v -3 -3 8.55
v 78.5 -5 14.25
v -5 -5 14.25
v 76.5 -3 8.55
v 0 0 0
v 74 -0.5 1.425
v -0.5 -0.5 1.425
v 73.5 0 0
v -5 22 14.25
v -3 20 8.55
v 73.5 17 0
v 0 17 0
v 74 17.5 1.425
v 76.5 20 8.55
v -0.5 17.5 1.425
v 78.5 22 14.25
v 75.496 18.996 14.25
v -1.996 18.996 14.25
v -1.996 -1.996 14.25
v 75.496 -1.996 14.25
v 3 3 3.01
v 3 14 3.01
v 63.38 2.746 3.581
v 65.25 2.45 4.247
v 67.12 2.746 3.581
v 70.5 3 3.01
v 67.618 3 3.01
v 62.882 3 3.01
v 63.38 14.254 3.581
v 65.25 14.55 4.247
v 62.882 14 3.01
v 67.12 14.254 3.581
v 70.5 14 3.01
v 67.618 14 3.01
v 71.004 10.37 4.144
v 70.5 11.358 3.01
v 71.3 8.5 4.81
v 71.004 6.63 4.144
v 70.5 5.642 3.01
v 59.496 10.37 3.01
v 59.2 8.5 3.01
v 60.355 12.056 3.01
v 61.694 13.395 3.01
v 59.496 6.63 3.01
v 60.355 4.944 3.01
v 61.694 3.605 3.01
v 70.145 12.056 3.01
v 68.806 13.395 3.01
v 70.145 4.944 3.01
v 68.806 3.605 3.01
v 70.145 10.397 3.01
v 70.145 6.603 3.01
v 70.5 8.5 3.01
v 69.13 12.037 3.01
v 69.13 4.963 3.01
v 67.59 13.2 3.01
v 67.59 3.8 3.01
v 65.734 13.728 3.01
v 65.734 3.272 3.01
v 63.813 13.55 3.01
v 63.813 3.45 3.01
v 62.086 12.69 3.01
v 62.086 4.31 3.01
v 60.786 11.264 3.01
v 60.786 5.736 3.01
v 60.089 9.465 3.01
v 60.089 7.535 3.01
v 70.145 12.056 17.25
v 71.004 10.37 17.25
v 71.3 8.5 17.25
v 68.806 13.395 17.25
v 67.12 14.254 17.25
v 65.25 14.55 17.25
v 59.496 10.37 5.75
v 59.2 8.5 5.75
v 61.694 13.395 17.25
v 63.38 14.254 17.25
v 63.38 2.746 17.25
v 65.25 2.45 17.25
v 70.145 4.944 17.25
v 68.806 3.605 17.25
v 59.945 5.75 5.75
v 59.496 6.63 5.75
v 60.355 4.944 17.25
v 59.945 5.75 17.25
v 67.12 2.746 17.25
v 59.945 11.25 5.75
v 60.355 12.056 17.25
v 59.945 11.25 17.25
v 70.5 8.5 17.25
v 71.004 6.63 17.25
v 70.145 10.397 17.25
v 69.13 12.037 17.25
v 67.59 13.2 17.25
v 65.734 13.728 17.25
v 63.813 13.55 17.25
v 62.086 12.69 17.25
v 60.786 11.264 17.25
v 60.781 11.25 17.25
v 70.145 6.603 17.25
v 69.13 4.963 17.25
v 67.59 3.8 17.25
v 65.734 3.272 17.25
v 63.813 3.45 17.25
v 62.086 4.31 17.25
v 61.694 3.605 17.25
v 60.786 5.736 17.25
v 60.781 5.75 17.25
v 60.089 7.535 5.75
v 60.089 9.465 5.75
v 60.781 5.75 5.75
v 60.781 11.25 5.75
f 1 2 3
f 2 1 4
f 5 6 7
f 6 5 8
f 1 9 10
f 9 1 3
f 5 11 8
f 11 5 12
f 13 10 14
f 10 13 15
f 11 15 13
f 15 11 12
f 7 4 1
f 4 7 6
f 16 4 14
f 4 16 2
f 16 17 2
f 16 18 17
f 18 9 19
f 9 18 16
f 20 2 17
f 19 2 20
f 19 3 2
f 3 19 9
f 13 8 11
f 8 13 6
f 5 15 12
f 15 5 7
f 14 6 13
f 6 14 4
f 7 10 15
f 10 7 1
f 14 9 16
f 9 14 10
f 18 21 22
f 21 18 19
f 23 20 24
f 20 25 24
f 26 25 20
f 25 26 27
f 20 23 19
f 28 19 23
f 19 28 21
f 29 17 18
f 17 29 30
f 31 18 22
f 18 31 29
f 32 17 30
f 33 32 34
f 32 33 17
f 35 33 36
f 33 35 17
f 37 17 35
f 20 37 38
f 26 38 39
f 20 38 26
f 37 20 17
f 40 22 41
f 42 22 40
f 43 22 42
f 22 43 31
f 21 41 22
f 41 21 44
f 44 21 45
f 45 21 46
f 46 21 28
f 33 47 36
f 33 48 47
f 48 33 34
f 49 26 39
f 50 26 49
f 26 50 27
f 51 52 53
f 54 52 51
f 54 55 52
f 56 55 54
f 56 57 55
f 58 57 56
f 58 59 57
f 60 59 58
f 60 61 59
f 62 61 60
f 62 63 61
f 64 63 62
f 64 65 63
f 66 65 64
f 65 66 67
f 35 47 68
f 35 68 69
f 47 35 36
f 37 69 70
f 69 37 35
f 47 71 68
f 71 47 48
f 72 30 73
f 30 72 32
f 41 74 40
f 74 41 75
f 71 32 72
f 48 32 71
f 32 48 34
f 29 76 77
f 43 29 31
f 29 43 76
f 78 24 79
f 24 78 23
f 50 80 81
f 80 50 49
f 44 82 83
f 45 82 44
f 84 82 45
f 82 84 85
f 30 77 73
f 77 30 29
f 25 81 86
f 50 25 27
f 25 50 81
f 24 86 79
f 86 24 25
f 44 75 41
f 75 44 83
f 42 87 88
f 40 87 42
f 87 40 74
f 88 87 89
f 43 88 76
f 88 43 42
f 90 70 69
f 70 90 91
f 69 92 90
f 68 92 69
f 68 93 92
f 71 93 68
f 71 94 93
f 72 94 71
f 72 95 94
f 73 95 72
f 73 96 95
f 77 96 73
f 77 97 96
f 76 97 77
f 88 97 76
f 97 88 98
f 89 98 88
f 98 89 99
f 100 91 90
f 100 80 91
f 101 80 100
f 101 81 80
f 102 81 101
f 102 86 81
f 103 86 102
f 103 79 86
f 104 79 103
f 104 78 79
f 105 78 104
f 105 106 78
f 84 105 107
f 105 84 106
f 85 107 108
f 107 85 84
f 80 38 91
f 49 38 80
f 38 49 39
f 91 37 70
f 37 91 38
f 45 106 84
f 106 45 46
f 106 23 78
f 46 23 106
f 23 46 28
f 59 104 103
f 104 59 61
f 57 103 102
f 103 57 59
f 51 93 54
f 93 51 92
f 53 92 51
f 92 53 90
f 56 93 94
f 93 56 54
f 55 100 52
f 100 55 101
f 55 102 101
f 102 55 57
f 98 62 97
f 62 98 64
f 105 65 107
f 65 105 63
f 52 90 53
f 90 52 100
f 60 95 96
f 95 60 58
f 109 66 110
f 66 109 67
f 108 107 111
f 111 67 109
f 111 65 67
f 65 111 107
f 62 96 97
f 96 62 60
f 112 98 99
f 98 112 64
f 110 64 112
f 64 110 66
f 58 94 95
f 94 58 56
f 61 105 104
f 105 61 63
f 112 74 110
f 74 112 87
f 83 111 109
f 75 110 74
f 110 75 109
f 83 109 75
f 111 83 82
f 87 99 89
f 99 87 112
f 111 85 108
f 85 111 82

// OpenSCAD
// file: triangulation.scad
function _furthestAwayFromPoint(points,poly,z,bestD=-1,bestPos=0,pos=0) = 
    len(poly) <= pos ? bestPos :
    norm(points[poly[pos]]-z) > bestD ? _furthestAwayFromPoint(points,poly,z,bestD=norm(points[poly[pos]]-z),bestPos=pos,pos=pos+1) :
    _furthestAwayFromPoint(points,poly,z,bestD=bestD,bestPos=bestPos,pos=pos+1);
    
function _triangleArea(a,b,c) = let(cr=cross(b-a,c-a)/2)
        is_num(cr) ? abs(cr) : norm(cr);
    
function _furthestAwayFromLine(points,poly,z1,z2,bestArea=-1,bestPos=0,pos=0) = 
    len(poly) <= pos ? bestPos :
    _triangleArea(z1,z2,points[poly[pos]]) > bestArea ? _furthestAwayFromLine(points,poly,z1,z2,bestArea=_triangleArea(z1,z2,points[poly[pos]]),bestPos=pos,pos=pos+1) :
    _furthestAwayFromLine(points,poly,z1,z2,bestArea=bestArea,bestPos=bestPos,pos=pos+1);
    
function normalize(v) = v/norm(v);

function _winding(points,poly,sum=0,pos=0) =
    pos >= len(poly) ? sum :
    _winding(points,poly,sum=sum+(points[poly[(pos+1)%len(poly)]][0]-points[poly[pos]][0])*(points[poly[(pos+1)%len(poly)]][1]+points[poly[pos]][1]),pos=pos+1);

function _isCCW(points,poly) =
_winding(points,poly) < 0;

function identifyPlane(points,poly) = 
let(i=_furthestAwayFromPoint(points,poly,points[poly[0]]),
           j=_furthestAwayFromLine(points,poly,points[poly[0]],points[poly[i]]),
           normal = cross(points[poly[i]]-points[poly[0]],points[poly[j]]-points[poly[0]]),
           a = points[poly[i]]-points[poly[0]],
           b = cross(normal,a),
           cs = [points[poly[0]],normalize(a),normalize(b),normalize(normal)])
           cs;
                      
function projectPoint(coordsys,p) = let(v=p-coordsys[0],
           vp=v-(v*coordsys[3])*coordsys[3]) [vp*coordsys[1],vp*coordsys[2]];
           
function projectPoints(coordsys,p) = [for(v=p) projectPoint(coordsys,v)];
    
function _removeDuplicates(points,poly)
    = [for (i=[0:len(poly)-1]) if (points[poly[(i+1)%len(poly)]] != points[poly[i]]) poly[i]];
    
function triangulate(points,poly=undef,holes=[]) = 
    let(poly = poly==undef ? [for(i=[0:1:len(points)-1]) i] : poly)
    let(poly = _removeDuplicates(points,poly),
        holes = [for(h=holes) _removeDuplicates(points,h)])
    len(points[poly[0]]) == 2 ?triangulate2D(points,poly,holes) : triangulate2D(projectPoints(identifyPlane(points,poly),points),poly,holes);
    
function _leftMostHoleData(points,holes,indexOfHole=0,indexInHole=0,bestData=undef,) =
    indexOfHole >= len(holes) ? bestData[1] :
    indexInHole >= len(holes[indexOfHole]) ? _leftMostHoleData(points,holes,indexOfHole=indexOfHole+1,indexInHole=0,bestData=bestData) :
    bestData==undef || points[holes[indexOfHole][indexInHole]][0] < bestData[0] ? _leftMostHoleData(points,holes,indexOfHole=indexOfHole,indexInHole=indexInHole+1,bestData=[points[holes[indexOfHole][indexInHole]][0], [indexOfHole, indexInHole]]) :
    _leftMostHoleData(points,holes,indexOfHole=indexOfHole,indexInHole=indexInHole+1,bestData=bestData);
    
function _rightMostPrimaryData(points,primary,limitX,pos=0,bestData=undef) =   
    pos >= len(primary) ?  bestData[1] :    
    points[primary[pos]][0] < limitX && (bestData==undef || points[primary[pos]] > bestData[0]) ?  _rightMostPrimaryData(points,primary,limitX,pos=pos+1,bestData=[points[primary[pos]][0],pos]) :
    _rightMostPrimaryData(points,primary,limitX,pos=pos+1,bestData=bestData);

function _makeLoop(start,loop,index) = concat([start],[for(i=[0:len(loop)]) loop[(i+index)%len(loop)]],[start]);

function _addLoop(primary,holes,indexWithinPrimary,indexOfHole,indexWithinHole) = 
    let(hole=holes[indexOfHole],
        newHoles=[for(i=[0:len(holes)-1]) if(i!=indexOfHole) holes[i]],
        newPrimary=[for(i=[0:len(primary)-1]) for(p= i!=indexWithinPrimary ? [primary[i]] : _makeLoop(primary[i],hole,indexWithinHole)) p])
       [newPrimary,newHoles];
        
function _removeHoles1(points,primary,holes) =
    len(holes) == 0 ? primary :
    let(holeData=_leftMostHoleData(points,holes),
        indexOfHole=holeData[0],
        indexWithinHole=holeData[1],
        holePointIndex=holes[indexOfHole][indexWithinHole],
        hp=points[holePointIndex],
        indexWithinPrimary=_rightMostPrimaryData(points,primary,hp[0]),
        primaryAndHoles=_addLoop(primary,holes,indexWithinPrimary,indexOfHole,indexWithinHole)) _removeHoles1(points,primaryAndHoles[0],primaryAndHoles[1]);   
        
function _removeHolesAndReorient(points,primary,holes) =    let(points=_isCCW(points,primary)?points:[for(p=points) [p[0],-p[1]]])
        [points,_removeHoles1(points,primary,[for(h=holes) _orient(newPoints,h,ccw=false)])];

function mod(a,b) = let(m=a%b) m < 0 ? m+b : m;

function _delPoint(v,i) = [for(j=[0:1:len(v)-1]) if(i!=j) v[j]];
    
function _isCCWTriangle(a,b,c) = cross(b-a,c-a) >= 0;
    
function _crosses(points,poly,a,b,ignore,pos=0) =     
    pos >= len(poly) ? false :
    ignore != pos && ignore !=  mod(pos+1,len(poly)) && _isCross(points[poly[pos]],points[poly[mod(pos+1,len(poly))]],a,b) ? true : _crosses(points,poly,a,b,pos=pos+1);

function _isReflex(points,poly,i) = 
    let(n=len(poly),
        a=points[poly[mod(i-1,n)]],
        b=points[poly[i]],
        c=points[poly[mod(i+1,n)]]) cross(b-a,c-b) < 0;
                
function _checkEar2(points,poly,a,b,c,j) = 
   let(p=points[poly[mod(j,len(poly))]],
       c1=cross(p-a,b-a))
       ! ( c1*cross(p-b,c-b) >0 && c1*cross(p-c,a-c)>0 );
                
function _checkEar(points,poly,a,b,c,i,j) =
    mod(j,len(poly))==mod(i-1,len(poly)) ? true :
    _isReflex(points,poly,mod(j,len(poly))) && ! _checkEar2(points,poly,a,b,c,j) ? false :
    _checkEar(points,poly,a,b,c,i,j+1);

function _isEar(points,poly,i) = 
    _isReflex(points,poly,i) ? false :
    let(n=len(poly),
        a=points[poly[mod(i-1,n)]],
        b=points[poly[i]],
        c=points[poly[mod(i+1,n)]],
        j=i+2)
        _checkEar(points,poly,a,b,c,i,i+2);        

function _findEar(points,poly,pos=0) =
    assert(pos<len(poly))
    _isEar(points,poly,pos) ? pos : _findEar(points,poly,pos=pos+1);

function _cutEar(points,poly) = 
    let(n=len(poly),
        i=_findEar(points,poly))
        _delPoint(poly,i);
            
function _getEar(points,poly) = 
    let(n=len(poly),
        i=_findEar(points,poly))
        [poly[mod(i-1,n)],poly[i],poly[mod(i+1,n)]];
        
function _reverse(v) = [for(i=[len(v)-1:-1:0]) v[i]];
    
function _orient(points,poly,ccw=true) = !!_isCCW(points,poly) == ccw ? poly : _reverse(poly);

function triangulate2D(points,poly,holes=[],soFar=[]) =
    let(pp = _removeHolesAndReorient(points,poly,holes),
    points=pp[0],
    poly=pp[1])
    len(poly) == 3 ? concat(soFar,[poly]) :
    triangulate2D(points,_cutEar(points,poly),soFar=concat(soFar,[_getEar(points,poly)]));
    
module showMesh(points,tt,width=1) 
{
    for(t=tt) {
        for(i=[0:1:len(t)-1]) {
            hull() {
                translate(points[t[i]]) sphere(d=width);
                translate(points[t[(i+1)%len(t)]]) sphere(d=width);
            }
        }
    }
}

function _find(needle,haystack) = let(f=search([needle], haystack)) f==[[]] ? undef : f[0];

function _refineTriangle(triangle,maxEdge) =
    let(a = triangle[0],
        b = triangle[1],
        c = triangle[2],
        ab = norm(a-b),
        bc = norm(b-c),
        ca = norm(c-a))
        ab <= maxEdge && bc <= maxEdge && ca <= maxEdge ? [triangle] :
        ab > maxEdge && bc > maxEdge && ca > maxEdge ? [[a,(a+b)/2,(a+c)/2],[b,(b+c)/2,(a+b)/2],[c,(a+c)/2,(b+c)/2],[(a+c)/2,(a+b)/2,(b+c)/2]] :
    ab > maxEdge && bc > maxEdge ? [[b,(b+c)/2,(a+b)/2],[a,(a+b)/2,(b+c)/2],[c,a,(b+c)/2]] :
    bc > maxEdge && ca > maxEdge ? [[c,(c+a)/2,(b+c)/2],[b,(b+c)/2,(c+a)/2],[a,b,(c+a)/2]] :
    ca > maxEdge && ab > maxEdge ? [[a,(a+b)/2,(c+a)/2],[c,(c+a)/2,(a+b)/2],[b,c,(a+b)/2]] :
    ab > maxEdge ? [[a,(a+b)/2,c],[(a+b)/2,b,c]] :
    bc > maxEdge ? [[b,(b+c)/2,a],[(b+c)/2,c,a]] :
    /*ca > maxEdge */ [[c,(c+a)/2,b],[(c+a)/2,a,b]];

function _refineMesh1(triangles,maxEdge,pos=0,newTriangles=[]) =
    pos >= len(triangles) ? newTriangles :
    _refineMesh1(triangles,maxEdge,pos=pos+1,newTriangles=concat(newTriangles,_refineTriangle(triangles[pos],maxEdge)));
    
/* simpler but slower */
function _refineMesh1(triangles,maxEdge) =
    [for(t=triangles) for(tr=_refineTriangle(t,maxEdge)) tr];


function _maxEdge(faces) = max([for(f=faces) for(i=[0:len(f)-1]) norm(f[(i+1)%len(f)]-f[i])]);

function _refineMeshN(triangles,maxEdge,n=0) =
    n <= 0 ? triangles : _refineMeshN(_refineMesh1(triangles,maxEdge),maxEdge,n=n-1);
    
function _newPointsAndFaces(pointsAndFaces,face,faceSoFar=[]) =
    let(pos=len(faceSoFar),
        points=pointsAndFaces[0],
        faces=pointsAndFaces[1]
    )
    pos >= len(face) ? [points,concat(faces,[faceSoFar])] :
    let(v=face[pos],
        i=_find(v,points)) i==undef ? _newPointsAndFaces([concat(points,[v]),faces],face,faceSoFar=concat(faceSoFar,[len(points)])) : _newPointsAndFaces(pointsAndFaces,face,faceSoFar=concat(faceSoFar,[i]));            
        
function _toPointsAndFaces(faces,pointsAndFaces=[[],[]], pos=0) =
    pos >= len(faces) ? pointsAndFaces :
    _toPointsAndFaces(faces,_newPointsAndFaces(pointsAndFaces,faces[pos]),pos=pos+1);
    
function refineMesh(mesh=undef,points=[],triangles=[],maxEdge=5) =
    let(
        points=mesh==undef?points:mesh[0],
        triangles=mesh==undef?triangles:mesh[1],
        tris = [for (t=triangles) [for (v=t) points[v]]],
        longestEdge = _maxEdge(tris),
        n = ceil(ln(longestEdge/maxEdge)/ln(2)),
        newTris = _refineMeshN(tris, maxEdge, n)) _toPointsAndFaces(newTris);
    
function _cutZ(a,b,z,normal) =
    let(an = a*normal)
        an == z ? a :
        let(bn = b*normal)
        bn == z ? b :
        let(t=(z-a*normal)/(b*normal-a*normal))
        (1-t)*a+t*b;
    
function _cutTriangle0(t, z, normal) = 
    /* cut lines joining vertex 0 to others */
    t[1]*normal == z ?
    let(cut02 = _cutZ(t[0],t[2],z,normal))
    [[cut02,t[0],t[1]],[cut02,t[1],t[2]]] :
    t[2][2] == z ?
    let(cut01 = _cutZ(t[0],t[1],z,normal))
    [[cut01,t[2],t[0]],[cut01,t[1],t[2]]] :
    let(cut01 = _cutZ(t[0],t[1],z,normal),
        cut02 = _cutZ(t[0],t[2],z,normal))
    [[cut02,t[0],cut01],
     [t[1],t[2],cut02],
     [cut02,cut01,t[1]]];

function _cutTriangle(t,z,normal) = 
    (t[0]*normal <= z && t[1]*normal <= z && t[2]*normal <= z) || (t[0]*normal >= z && t[1]*normal >= z && t[2]*normal >= z ) ? [t] :
    (t[0]*normal >= z && t[1]*normal >= z) || (t[0]*normal <= z && t[1]*normal <= z) ? _cutTriangle0([t[2],t[0],t[1]], z,normal) :
    (t[1]*normal >= z && t[2]*normal >= z) || (t[1]*normal <= z && t[2]*normal <= z) ? _cutTriangle0(t, z, normal) :
    _cutTriangle0([t[1],t[2],t[0]],z, normal);

function cutMesh(mesh=undef,points=[],triangles=[],slice=0,normal=[1,0,0]) =
        sliceMesh(mesh=mesh,points=points,triangles=triangles,slices=[slice],normal=normal);
            
function _normalize(v) = 
    let(vv = 
        v[0] == 0 && v[1] == 0 ? [0,0,sign(v[2])] :
        v[0] == 0 && v[2] == 0 ? [0,sign(v[1]),0] :
        v[1] == 0 && v[2] == 0 ? [sign(v[0]),0,0] :
        v / norm(v))
        [for(i=[0:1:len(v)-1]) vv[i]];
            
function _sliceTriangles(triangles,slices,normal,pos=0) =
    pos >= len(slices) ? triangles :
    _sliceTriangles([for(t=triangles) for(s=_cutTriangle(t,slices[pos],normal)) s],slices,normal,pos=pos+1);
        
function _makeSlices(points,triangles,slices,normal,spacing) =
    slices != undef ? slices :
    let(zs = [for(t=triangles) for(v=t) points[v]*normal],
        zMin = min(zs),
        zMax = max(zs),
        n = ceil((zMax-zMin) / spacing)-1)
        echo(n)n <= 0 ? [] :
        [for(i=[1:1:n]) zMin+i*spacing];    

function sliceMesh(mesh=undef,points=[],triangles=[],slices=undef,spacing=undef,normal=[1,0,0]) =
        let(points=mesh==undef?points:mesh[0],triangles=mesh==undef?triangles:mesh[1],
        normal=_normalize(normal),
        slices=_makeSlices(points,triangles,slices,normal,spacing))
        _toPointsAndFaces(_sliceTriangles([for(t=triangles) [for (v=t) points[v]]],slices,normal));
            
function _origin(dimensions) = [for(i=[0:1:dimensions-1]) 0];        
            
function _cmCalc(points,triangles,pos=0,weightedSum=undef,sumWeights=0) =
        pos >= len(triangles) ?  weightedSum/sumWeights :
        _cmCalc(points,triangles,pos=pos+1,weightedSum=(weightedSum==undef?_origin(len(points[0])):weightedSum)+_triangleArea(points[triangles[pos][0]],points[triangles[pos][1]],points[triangles[pos][2]])*(points[triangles[pos][0]]+points[triangles[pos][1]]+points[triangles[pos][2]])/3,sumWeights=sumWeights+_triangleArea(points[triangles[pos][0]],points[triangles[pos][1]],points[triangles[pos][2]]));
    
function centerOfMass(mesh=undef,points=[],triangles=[]) =
        let(points=mesh==undef?points:mesh[0],triangles=mesh==undef?triangles:mesh[1])
        _cmCalc(points,triangles);
        
//<skip>
/*
function testPoly2(n) = concat([for(i=[0:n-1]) 20*[cos(i*360/n),rands(-.3,.3,1)[0],sin(i*360/n)]],[for(i=[0:n-1]) 20*[0.8*cos(i*360/n),rands(-.3,.3,1)[0],-0.8*sin(i*360/n)]]);

testPoints=testPoly2(11);
tt = triangulate(testPoints);
m = refineMesh(points=testPoints,triangles=tt,maxEdge=5);
showMesh(m[0],m[1],width=.2);
*/
//</skip>
// main file
use <tubemesh.scad>;

//<params>
insideHeight=11;
insideWidth=10.5;
insideLength=67;
wallThickness=3;
socketOffsetFromEnd=0;
socketDiameter=10; // was 9.6
socketStickout=3;
socketWallThickness=0.8;
wireHoleHeight=8;
wireHoleWidth=5;
flange=5;
tolerance=0.25;
//</params>

module dummy(){}

nudge = 0.01;

insideHeight1=insideHeight+tolerance;
insideWidth1=insideWidth+2*tolerance;
socketDiameter1=socketDiameter+2*tolerance;
insideLength1=insideLength+2*tolerance;

module box(wallThickness) {
    x = 2*wallThickness+insideLength1;
    y = 2*wallThickness+insideWidth1;
    top = [[-flange,-flange],[x+flange,-flange],[x+flange,y+flange],[-flange,y+flange]];
    base = [[0,0],[x,0],[x,y],[0,y]];
    morphExtrude(base,top,height=insideHeight1+wallThickness);
//    cube([2*wallThickness+insideLength1,2*wallThickness+insideWidth1,wallThickness+insideHeight1]);
}

render(convexity=2) {
    difference() {
        box(wallThickness);
        translate([wallThickness,wallThickness,wallThickness+nudge]) box(0);
    }
    translate([wallThickness+insideLength1-socketDiameter1/2-socketOffsetFromEnd,wallThickness+insideWidth1/2,0]) difference() {
            cylinder(d=socketDiameter1+2*socketWallThickness,h=insideHeight1+wallThickness+socketStickout);
            cylinder(d=socketDiameter1,h=insideHeight1+wallThickness+socketStickout+nudge);
            translate([-socketDiameter1,-wireHoleWidth/2-tolerance,insideHeight1+wallThickness-wireHoleHeight-2*tolerance]) cube([socketDiameter1,wireHoleWidth+2*tolerance,wireHoleHeight+2*tolerance+socketStickout]);
    }
}
